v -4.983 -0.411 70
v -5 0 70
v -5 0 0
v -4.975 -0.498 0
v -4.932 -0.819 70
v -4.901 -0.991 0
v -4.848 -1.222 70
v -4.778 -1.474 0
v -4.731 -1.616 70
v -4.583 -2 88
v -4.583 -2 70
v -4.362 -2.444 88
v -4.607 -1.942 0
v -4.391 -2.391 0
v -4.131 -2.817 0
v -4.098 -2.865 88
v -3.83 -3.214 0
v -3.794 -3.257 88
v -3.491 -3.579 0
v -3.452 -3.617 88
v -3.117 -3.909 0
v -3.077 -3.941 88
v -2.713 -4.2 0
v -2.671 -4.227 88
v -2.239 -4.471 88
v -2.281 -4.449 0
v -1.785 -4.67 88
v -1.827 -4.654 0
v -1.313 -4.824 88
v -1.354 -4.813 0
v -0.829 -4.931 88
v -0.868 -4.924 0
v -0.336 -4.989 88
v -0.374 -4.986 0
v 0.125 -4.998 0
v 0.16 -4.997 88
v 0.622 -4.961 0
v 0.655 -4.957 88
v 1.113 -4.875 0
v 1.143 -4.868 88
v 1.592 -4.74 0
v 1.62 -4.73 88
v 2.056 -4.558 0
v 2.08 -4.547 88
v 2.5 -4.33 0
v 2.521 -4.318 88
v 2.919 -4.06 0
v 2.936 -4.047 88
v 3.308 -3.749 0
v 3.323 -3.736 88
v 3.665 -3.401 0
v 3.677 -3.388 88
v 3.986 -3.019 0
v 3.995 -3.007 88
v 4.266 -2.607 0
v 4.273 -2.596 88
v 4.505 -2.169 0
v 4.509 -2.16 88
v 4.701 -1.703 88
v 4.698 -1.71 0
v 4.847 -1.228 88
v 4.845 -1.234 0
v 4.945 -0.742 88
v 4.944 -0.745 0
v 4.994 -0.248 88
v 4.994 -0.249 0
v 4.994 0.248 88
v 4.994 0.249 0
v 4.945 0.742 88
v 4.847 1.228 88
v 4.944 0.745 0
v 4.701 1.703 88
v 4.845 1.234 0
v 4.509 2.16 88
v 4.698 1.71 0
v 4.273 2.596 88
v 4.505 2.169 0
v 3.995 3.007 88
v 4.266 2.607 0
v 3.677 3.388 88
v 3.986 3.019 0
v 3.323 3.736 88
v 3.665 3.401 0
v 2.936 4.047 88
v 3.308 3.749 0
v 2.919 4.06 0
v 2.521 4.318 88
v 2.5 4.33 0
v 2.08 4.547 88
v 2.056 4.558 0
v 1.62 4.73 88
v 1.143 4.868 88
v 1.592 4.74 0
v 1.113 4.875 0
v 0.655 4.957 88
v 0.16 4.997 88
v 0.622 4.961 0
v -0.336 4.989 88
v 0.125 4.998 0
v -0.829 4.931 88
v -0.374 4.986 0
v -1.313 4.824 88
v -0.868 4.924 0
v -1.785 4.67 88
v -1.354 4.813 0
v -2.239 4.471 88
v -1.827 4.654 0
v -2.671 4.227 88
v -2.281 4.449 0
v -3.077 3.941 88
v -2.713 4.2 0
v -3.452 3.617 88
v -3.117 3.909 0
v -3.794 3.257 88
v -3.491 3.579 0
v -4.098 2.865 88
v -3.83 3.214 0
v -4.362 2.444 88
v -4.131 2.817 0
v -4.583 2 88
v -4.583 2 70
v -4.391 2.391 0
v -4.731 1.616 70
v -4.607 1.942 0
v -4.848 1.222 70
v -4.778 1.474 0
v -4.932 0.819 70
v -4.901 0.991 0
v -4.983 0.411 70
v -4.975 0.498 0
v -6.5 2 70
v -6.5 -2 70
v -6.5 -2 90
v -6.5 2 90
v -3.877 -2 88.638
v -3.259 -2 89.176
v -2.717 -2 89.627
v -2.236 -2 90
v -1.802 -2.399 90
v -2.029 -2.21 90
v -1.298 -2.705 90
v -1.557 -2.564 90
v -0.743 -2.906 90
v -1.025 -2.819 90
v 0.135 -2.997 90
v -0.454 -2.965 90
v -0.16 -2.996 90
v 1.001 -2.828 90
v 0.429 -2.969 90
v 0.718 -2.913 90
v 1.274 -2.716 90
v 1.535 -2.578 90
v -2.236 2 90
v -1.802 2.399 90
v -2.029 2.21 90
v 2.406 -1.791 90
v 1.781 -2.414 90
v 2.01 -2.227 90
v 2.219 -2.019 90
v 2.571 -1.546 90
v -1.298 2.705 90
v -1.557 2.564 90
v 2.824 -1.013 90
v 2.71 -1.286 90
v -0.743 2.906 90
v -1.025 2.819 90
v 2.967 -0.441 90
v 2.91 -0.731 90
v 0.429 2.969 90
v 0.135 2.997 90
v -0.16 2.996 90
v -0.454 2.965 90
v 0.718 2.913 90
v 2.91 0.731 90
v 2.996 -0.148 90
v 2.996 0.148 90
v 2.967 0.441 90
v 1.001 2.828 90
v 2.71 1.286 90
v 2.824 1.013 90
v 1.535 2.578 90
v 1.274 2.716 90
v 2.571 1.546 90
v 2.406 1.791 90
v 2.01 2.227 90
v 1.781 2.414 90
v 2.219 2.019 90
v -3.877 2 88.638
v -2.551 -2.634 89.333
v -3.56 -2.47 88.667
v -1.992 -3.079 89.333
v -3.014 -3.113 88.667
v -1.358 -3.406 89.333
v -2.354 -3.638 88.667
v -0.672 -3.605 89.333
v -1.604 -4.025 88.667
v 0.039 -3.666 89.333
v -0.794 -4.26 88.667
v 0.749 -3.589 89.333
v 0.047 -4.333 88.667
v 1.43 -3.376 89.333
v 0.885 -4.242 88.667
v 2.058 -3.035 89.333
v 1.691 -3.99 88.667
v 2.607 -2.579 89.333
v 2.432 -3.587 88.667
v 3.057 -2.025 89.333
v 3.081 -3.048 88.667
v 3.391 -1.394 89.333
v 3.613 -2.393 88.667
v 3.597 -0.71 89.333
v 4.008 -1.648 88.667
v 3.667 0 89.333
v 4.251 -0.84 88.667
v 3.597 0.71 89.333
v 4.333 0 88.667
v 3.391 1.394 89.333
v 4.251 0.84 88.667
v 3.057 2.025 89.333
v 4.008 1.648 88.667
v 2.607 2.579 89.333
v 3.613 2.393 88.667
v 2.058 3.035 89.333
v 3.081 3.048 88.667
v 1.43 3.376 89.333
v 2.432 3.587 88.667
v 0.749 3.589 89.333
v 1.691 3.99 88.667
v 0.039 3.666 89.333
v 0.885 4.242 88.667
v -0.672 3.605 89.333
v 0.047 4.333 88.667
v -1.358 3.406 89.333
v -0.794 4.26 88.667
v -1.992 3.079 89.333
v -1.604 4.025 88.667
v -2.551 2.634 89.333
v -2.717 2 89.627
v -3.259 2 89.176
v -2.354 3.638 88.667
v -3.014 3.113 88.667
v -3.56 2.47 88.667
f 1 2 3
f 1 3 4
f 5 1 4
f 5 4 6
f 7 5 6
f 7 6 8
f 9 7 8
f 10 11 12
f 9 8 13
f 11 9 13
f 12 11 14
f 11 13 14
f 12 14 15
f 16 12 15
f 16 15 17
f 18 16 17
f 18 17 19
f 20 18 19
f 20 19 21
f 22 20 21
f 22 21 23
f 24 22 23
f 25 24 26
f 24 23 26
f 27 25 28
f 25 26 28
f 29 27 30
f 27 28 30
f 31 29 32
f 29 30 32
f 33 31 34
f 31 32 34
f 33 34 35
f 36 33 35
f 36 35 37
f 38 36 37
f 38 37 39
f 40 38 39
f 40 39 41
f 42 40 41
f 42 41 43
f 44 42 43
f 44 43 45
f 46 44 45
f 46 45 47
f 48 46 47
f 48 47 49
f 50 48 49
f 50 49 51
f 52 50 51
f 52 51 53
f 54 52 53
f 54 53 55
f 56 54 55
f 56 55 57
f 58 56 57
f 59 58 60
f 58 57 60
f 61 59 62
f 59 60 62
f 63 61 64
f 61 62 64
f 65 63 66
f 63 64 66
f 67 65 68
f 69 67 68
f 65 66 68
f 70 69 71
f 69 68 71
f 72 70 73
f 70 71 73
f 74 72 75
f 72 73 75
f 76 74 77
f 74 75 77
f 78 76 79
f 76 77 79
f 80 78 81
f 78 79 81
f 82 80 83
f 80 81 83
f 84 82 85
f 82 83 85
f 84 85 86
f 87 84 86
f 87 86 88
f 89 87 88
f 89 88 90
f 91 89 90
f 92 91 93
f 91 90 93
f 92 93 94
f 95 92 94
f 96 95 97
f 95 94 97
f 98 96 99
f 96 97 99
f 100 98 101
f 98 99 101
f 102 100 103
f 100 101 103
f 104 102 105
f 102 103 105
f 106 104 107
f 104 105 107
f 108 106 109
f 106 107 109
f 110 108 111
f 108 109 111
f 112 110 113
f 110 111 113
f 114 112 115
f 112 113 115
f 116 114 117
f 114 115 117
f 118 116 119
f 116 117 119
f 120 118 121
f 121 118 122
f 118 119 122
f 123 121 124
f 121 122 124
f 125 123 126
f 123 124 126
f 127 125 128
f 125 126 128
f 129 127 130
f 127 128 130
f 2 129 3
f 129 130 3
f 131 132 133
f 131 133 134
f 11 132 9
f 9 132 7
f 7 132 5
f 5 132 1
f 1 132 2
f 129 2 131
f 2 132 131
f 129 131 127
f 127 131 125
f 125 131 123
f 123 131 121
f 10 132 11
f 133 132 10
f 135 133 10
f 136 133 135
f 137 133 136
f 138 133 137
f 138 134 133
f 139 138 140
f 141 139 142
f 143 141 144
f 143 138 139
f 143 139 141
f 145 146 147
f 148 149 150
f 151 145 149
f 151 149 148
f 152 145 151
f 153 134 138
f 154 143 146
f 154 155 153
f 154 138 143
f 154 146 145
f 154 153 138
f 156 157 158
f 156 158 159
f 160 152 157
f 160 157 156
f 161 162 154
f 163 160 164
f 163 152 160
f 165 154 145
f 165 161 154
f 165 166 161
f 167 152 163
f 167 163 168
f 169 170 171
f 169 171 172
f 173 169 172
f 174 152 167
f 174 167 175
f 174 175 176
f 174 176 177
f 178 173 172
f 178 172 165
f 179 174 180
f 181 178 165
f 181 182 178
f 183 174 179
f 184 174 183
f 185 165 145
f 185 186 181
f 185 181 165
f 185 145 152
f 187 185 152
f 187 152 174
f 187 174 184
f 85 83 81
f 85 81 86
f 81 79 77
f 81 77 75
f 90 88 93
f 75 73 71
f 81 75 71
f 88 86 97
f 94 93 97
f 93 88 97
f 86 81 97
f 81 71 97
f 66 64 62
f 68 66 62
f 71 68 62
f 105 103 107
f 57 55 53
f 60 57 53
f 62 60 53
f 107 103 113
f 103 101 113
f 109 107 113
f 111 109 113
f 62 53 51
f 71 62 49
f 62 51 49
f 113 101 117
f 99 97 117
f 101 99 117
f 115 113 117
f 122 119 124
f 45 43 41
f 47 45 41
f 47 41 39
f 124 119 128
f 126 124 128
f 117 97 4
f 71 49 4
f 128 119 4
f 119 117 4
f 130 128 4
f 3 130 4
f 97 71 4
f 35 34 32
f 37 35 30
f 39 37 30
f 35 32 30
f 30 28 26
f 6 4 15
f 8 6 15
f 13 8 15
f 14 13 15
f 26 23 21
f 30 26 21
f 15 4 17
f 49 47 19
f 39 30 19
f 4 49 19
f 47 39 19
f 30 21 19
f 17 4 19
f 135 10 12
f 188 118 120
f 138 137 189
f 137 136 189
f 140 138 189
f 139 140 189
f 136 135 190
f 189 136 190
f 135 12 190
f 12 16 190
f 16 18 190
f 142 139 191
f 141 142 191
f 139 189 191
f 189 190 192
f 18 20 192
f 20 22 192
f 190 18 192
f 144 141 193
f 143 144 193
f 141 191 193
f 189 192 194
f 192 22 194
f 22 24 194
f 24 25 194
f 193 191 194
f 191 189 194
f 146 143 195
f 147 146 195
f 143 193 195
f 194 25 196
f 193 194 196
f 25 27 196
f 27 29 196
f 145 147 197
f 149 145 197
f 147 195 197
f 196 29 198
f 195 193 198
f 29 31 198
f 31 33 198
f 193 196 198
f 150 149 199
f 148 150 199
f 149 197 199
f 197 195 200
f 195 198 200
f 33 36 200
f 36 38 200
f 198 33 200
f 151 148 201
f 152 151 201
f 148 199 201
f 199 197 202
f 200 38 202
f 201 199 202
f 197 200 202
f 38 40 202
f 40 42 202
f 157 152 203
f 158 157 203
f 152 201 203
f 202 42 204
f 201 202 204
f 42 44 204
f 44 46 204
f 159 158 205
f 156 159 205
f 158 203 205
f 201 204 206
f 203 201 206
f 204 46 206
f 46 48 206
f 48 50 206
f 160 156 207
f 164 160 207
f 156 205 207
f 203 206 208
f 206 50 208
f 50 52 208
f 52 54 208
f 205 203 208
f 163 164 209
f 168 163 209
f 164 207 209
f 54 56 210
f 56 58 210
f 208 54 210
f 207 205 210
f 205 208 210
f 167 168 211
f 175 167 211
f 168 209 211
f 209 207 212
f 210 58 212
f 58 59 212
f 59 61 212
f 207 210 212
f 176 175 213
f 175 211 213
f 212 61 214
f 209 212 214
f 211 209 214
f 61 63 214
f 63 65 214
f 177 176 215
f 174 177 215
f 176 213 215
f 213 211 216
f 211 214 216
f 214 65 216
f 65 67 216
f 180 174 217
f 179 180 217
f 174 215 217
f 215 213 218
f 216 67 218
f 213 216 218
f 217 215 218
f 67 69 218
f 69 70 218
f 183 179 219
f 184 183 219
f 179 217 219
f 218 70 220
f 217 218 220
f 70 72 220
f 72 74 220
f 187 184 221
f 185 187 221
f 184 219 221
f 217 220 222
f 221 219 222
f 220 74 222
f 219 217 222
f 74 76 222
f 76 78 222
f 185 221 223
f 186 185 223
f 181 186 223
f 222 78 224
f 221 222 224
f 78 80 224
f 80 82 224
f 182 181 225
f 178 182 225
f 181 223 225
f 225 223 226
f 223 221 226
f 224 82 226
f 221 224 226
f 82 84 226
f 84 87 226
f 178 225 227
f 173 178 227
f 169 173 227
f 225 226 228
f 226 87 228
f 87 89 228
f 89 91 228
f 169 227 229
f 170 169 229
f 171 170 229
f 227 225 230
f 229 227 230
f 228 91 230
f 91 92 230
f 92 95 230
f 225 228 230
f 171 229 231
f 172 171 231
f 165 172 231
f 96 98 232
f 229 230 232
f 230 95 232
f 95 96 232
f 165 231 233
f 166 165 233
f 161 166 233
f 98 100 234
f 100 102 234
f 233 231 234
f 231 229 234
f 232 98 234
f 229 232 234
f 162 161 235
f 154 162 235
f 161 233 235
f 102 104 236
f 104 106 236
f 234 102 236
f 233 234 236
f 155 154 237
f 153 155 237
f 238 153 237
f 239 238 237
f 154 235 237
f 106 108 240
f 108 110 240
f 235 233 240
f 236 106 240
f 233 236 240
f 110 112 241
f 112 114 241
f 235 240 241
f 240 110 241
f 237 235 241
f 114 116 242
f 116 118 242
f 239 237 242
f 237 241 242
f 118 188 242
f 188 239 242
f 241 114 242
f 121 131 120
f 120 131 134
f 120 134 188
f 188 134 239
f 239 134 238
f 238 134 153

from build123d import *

# Parameters (mm, degrees)
SKETCH_1_R      = 5
EXTRUDE_1_DEPTH = 90
SKETCH_2_W      = 6.5
SKETCH_2_H      = 4
EXTRUDE_2_DEPTH = 20
CHAMFER_1_SIZE  = 2


with BuildPart() as part:
    # 草图1 → 凸台-拉伸1 (new body)
    with BuildSketch(Plane.XY):
        with Locations(Location((0, 0, 0), (0, 0, 180))):
            Circle(SKETCH_1_R)
    extrude(amount=EXTRUDE_1_DEPTH)

    # 草图2 → 凸台-拉伸2 (add)
    with BuildSketch(Plane.XY.offset(90)):
        with Locations((-3.25, 0)):
            Rectangle(SKETCH_2_W, SKETCH_2_H)
    extrude(amount=-EXTRUDE_2_DEPTH)

    # 倒角1
    chamfer_1_edges = [part.edges().sort_by_distance(p)[0] for p in [
        (5, 0, 90),
    ]]
    chamfer(chamfer_1_edges, length=CHAMFER_1_SIZE)


solid = part.part
